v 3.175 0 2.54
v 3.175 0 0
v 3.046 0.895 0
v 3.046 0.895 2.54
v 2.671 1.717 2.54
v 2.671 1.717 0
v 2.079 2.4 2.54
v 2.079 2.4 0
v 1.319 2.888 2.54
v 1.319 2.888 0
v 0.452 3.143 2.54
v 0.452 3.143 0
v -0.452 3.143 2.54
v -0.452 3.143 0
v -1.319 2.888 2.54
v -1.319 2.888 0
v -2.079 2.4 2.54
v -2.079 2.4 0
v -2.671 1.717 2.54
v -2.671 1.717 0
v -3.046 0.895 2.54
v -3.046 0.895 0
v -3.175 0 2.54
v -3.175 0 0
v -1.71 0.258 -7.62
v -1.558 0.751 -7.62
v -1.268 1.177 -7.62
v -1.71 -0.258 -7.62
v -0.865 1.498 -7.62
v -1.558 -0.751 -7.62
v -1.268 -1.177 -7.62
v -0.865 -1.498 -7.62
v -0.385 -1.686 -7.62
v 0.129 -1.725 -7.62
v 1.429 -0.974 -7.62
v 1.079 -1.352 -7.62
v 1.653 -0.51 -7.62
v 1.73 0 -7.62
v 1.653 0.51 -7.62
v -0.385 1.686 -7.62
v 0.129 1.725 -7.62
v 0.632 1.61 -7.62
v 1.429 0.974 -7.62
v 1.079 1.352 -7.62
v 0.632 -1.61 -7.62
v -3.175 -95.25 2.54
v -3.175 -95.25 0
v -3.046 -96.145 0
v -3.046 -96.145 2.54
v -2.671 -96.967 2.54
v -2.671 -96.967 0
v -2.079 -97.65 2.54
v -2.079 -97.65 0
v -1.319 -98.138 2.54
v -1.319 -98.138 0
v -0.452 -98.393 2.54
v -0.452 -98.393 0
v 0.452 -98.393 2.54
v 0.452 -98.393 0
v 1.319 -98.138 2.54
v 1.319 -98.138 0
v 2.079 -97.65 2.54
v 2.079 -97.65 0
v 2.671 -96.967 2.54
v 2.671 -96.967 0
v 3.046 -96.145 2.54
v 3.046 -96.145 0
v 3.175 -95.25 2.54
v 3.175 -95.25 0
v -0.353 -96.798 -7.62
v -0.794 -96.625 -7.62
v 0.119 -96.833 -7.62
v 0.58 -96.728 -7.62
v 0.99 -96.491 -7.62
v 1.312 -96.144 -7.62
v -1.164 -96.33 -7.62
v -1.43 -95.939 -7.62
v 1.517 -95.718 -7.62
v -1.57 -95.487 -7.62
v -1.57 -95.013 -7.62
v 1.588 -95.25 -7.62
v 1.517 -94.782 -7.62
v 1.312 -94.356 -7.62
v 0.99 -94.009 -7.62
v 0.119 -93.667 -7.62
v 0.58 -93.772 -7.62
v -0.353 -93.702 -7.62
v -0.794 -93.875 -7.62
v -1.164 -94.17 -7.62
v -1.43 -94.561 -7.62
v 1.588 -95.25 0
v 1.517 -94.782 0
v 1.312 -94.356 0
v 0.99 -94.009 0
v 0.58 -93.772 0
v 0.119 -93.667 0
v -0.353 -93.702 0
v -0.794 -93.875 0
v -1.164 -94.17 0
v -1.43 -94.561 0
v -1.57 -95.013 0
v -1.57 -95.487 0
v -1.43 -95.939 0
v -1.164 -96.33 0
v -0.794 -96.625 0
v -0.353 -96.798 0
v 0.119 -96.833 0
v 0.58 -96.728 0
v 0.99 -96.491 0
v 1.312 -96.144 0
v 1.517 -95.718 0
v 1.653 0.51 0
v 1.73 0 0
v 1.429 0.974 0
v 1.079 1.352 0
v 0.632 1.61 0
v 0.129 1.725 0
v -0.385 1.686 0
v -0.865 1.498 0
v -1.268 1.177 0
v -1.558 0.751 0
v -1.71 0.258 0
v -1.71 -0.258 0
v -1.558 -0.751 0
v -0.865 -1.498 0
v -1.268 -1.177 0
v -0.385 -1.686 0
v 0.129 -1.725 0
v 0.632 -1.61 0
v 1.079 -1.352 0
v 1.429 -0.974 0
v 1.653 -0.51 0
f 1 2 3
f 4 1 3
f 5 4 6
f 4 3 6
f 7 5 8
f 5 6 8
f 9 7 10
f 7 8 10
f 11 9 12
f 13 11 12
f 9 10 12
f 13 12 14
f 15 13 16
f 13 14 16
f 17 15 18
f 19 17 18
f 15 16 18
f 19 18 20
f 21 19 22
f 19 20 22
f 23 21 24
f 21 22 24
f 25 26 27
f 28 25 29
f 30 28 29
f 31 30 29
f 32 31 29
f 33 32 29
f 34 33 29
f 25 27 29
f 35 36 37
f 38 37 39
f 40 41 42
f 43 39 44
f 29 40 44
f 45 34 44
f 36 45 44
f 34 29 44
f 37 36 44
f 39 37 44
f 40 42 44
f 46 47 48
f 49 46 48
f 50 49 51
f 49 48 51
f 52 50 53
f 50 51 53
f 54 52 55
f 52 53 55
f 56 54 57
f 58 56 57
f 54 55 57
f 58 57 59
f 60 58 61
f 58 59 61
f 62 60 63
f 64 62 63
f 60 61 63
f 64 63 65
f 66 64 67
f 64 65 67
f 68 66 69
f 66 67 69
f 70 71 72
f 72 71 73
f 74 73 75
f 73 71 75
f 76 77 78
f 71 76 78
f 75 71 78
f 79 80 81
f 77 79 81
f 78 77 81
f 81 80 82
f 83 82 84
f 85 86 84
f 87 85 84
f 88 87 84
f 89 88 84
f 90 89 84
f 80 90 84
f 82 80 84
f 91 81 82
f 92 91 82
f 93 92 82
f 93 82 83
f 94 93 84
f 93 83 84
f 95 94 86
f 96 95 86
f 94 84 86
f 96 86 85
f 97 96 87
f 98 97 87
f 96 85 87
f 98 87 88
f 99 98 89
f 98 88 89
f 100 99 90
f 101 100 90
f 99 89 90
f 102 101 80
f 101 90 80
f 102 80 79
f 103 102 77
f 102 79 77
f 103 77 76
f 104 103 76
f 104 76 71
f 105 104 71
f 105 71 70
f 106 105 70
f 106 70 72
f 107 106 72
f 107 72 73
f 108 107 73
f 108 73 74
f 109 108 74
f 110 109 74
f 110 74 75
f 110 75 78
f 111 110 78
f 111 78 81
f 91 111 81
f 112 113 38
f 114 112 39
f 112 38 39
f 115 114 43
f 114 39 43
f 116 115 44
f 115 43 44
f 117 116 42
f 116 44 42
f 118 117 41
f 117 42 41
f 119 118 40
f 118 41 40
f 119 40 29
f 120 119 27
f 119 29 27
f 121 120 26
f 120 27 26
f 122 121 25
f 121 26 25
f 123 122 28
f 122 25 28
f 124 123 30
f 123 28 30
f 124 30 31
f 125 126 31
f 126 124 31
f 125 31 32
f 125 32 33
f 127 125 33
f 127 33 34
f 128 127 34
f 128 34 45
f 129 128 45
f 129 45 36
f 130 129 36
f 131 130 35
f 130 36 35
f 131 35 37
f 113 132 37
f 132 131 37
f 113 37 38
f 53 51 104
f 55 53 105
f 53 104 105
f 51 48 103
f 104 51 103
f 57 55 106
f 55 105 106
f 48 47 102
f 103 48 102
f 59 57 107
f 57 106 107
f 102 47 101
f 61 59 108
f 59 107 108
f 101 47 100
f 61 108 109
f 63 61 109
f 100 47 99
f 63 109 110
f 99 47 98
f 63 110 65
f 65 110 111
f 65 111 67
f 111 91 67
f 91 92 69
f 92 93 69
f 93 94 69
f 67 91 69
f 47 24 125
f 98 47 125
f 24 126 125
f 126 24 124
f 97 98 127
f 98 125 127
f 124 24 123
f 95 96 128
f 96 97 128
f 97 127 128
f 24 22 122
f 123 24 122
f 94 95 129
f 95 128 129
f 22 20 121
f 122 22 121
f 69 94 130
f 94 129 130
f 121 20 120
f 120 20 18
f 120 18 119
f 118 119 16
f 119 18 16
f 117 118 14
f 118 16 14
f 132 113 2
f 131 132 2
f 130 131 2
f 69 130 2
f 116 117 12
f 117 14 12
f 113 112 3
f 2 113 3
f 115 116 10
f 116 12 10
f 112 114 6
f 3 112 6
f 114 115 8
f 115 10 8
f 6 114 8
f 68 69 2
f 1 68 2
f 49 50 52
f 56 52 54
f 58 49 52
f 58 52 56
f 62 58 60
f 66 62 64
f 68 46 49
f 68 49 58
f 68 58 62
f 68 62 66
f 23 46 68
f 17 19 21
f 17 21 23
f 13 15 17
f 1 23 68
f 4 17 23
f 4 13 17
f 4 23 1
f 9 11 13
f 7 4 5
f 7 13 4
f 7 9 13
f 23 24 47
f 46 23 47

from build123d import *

# Parameters (mm, degrees)
SKETCH1_R           = 1.5875
BOSS_EXTRUDE1_DEPTH = 2.54
BOSS_EXTRUDE2_START = -10.16
SKETCH2_R           = 1.72979554
SKETCH2_R_2         = 1.5875
BOSS_EXTRUDE2_DEPTH = 10.16


with BuildPart() as part:
    # Sketch1 → Boss-Extrude1 (new body)
    with BuildSketch(Plane.XY):
        with BuildLine():
            Line((-3.175, 0), (-3.175, -95.25))
            ThreePointArc((-3.175, -95.25), (0, -98.425), (3.175, -95.25))
            Line((3.175, -95.25), (3.175, 0))
            ThreePointArc((3.175, 0), (0, 3.175), (-3.175, 0))
        make_face()
        Circle(SKETCH1_R, mode=Mode.SUBTRACT)
        with Locations((0, -95.25)):
            Circle(SKETCH1_R, mode=Mode.SUBTRACT)
    extrude(amount=BOSS_EXTRUDE1_DEPTH)

    # Sketch2 → Boss-Extrude2 (add)
    with BuildSketch(Plane.XY.offset(2.54).offset(BOSS_EXTRUDE2_START)):
        Circle(SKETCH2_R)
        with Locations((0, -95.25)):
            Circle(SKETCH2_R_2)
    extrude(amount=BOSS_EXTRUDE2_DEPTH)


solid = part.part
